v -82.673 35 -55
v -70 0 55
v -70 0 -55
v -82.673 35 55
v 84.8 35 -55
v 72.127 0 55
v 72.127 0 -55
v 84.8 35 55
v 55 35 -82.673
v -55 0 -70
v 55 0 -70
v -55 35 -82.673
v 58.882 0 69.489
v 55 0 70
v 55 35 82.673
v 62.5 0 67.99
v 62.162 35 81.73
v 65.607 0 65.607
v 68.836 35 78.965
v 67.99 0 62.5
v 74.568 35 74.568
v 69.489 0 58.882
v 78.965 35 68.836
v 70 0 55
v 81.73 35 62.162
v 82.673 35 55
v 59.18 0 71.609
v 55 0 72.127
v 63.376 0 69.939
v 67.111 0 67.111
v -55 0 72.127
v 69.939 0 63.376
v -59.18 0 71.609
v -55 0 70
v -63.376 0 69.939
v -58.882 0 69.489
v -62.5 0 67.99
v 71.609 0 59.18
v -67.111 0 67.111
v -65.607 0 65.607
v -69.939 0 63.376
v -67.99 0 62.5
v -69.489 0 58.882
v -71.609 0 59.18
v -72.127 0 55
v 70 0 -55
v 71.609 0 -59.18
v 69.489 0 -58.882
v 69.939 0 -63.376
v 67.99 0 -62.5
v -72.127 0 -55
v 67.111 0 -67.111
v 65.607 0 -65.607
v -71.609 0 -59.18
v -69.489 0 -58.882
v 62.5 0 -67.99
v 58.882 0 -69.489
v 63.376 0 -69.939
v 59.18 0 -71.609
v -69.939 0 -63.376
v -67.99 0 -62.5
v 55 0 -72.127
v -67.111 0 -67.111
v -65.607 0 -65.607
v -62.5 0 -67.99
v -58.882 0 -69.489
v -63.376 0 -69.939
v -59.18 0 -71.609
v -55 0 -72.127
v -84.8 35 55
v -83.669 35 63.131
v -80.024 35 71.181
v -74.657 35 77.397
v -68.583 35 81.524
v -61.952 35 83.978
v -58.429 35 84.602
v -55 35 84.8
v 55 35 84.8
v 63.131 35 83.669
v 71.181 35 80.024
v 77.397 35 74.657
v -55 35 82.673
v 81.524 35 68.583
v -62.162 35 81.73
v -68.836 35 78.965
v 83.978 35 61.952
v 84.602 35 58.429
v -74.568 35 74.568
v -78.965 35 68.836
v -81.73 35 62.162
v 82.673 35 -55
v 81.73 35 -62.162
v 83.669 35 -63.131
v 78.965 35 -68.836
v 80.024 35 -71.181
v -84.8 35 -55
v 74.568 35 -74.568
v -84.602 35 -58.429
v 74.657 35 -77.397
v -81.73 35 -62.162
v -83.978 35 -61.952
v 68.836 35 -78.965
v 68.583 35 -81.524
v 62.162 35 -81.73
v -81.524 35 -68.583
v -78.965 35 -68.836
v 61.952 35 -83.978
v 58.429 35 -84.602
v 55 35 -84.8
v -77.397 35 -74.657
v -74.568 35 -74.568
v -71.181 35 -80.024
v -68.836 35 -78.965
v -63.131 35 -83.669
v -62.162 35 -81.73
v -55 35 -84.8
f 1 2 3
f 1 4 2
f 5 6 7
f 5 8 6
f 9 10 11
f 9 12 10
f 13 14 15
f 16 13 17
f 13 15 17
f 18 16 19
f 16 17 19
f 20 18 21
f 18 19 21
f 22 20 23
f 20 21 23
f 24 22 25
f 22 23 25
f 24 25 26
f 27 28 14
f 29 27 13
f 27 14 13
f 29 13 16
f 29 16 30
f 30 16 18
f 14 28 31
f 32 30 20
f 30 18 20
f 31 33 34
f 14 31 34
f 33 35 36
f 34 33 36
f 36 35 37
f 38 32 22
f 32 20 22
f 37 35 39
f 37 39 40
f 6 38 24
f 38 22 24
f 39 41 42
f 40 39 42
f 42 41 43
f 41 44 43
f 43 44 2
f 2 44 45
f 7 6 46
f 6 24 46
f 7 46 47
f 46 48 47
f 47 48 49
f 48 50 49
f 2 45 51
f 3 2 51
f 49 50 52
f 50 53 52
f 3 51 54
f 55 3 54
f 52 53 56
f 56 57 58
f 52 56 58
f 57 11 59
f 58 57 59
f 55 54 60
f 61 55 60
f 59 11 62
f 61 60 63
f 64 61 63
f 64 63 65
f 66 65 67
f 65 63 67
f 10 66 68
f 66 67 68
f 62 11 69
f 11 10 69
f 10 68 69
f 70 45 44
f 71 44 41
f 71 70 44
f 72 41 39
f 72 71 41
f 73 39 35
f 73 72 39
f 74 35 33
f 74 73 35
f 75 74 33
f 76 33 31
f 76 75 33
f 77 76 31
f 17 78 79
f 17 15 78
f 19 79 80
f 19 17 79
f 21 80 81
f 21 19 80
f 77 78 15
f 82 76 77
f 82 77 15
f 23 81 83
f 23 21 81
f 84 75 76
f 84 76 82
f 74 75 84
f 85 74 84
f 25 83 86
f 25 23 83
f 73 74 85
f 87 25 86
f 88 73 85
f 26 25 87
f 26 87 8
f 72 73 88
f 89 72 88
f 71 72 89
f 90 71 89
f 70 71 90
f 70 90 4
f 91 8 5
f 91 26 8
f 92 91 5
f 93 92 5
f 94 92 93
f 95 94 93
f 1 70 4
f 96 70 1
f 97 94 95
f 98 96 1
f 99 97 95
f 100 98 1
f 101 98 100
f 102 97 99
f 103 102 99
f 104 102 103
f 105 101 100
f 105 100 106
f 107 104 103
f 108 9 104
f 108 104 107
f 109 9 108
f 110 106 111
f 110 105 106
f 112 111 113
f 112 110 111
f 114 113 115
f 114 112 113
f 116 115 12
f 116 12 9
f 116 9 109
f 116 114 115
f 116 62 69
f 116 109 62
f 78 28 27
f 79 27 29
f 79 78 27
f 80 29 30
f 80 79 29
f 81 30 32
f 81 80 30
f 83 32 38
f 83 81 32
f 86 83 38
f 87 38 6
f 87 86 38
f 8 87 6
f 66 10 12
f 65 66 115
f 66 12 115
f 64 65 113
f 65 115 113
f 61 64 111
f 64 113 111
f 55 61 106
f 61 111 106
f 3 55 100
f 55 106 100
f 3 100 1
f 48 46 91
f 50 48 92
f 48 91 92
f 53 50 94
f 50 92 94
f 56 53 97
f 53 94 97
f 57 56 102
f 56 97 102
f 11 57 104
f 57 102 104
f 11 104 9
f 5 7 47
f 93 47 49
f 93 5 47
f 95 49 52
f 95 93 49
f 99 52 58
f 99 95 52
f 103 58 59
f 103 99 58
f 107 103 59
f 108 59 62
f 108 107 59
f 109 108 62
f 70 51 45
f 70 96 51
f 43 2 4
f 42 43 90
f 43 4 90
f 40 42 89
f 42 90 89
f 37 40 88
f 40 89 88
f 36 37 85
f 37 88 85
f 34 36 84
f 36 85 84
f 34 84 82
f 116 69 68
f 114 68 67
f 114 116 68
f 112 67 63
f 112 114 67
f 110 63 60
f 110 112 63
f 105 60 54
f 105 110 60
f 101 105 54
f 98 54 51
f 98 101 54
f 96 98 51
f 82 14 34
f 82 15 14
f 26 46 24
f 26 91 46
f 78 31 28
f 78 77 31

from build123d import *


with BuildPart() as part:
    # Outlet Profile for Hopper Shape → Hopper Shape section 0
    with BuildSketch(Plane(origin=(0, 0, 0), x_dir=(1, 0, 0), z_dir=(0, 1, 0))):
        with BuildLine():
            Line((-55, -72.127068082), (55, -72.127068082))
            # circular arc as an exact rational Bezier (weights 1, cos(half-angle), 1)
            Bezier((55, -72.127068082), (72.127068082, -72.127068082), (72.127068082, -55), weights=[1, 0.707106781, 1])
            Line((72.127068082, -55), (72.127068082, 55))
            Bezier((72.127068082, 55), (72.127068082, 72.127068082), (55, 72.127068082), weights=[1, 0.707106781, 1])
            Line((55, 72.127068082), (-55, 72.127068082))
            Bezier((-55, 72.127068082), (-72.127068082, 72.127068082), (-72.127068082, 55), weights=[1, 0.707106781, 1])
            Line((-72.127068082, 55), (-72.127068082, -55))
            Bezier((-72.127068082, -55), (-72.127068082, -72.127068082), (-55, -72.127068082), weights=[1, 0.707106781, 1])
        make_face()
    # Inlet Profile for Hopper Shape → Hopper Shape section 1
    with BuildSketch(Plane(origin=(0, 35, 0), x_dir=(1, 0, 0), z_dir=(0, 1, 0))):
        with BuildLine():
            Line((-55, -84.8), (55, -84.8))
            Bezier((55, -84.8), (84.8, -84.8), (84.8, -55), weights=[1, 0.707106781, 1])
            Line((84.8, -55), (84.8, 55))
            Bezier((84.8, 55), (84.8, 84.8), (55, 84.8), weights=[1, 0.707106781, 1])
            Line((55, 84.8), (-55, 84.8))
            Bezier((-55, 84.8), (-84.8, 84.8), (-84.8, 55), weights=[1, 0.707106781, 1])
            Line((-84.8, 55), (-84.8, -55))
            Bezier((-84.8, -55), (-84.8, -84.8), (-55, -84.8), weights=[1, 0.707106781, 1])
        make_face()
    loft()

    # Wall Thickness: read off the stored shape, not the designer's step
    # Wall Thickness: loft between two sections, ruled curve by curve
    wall_thickness_from = [
        Edge.make_three_point_arc((-55, 0, -70), (-65.606601718, 0, -65.606601718), (-70, 0, -55)),
        Edge.make_three_point_arc((-70, 0, 55), (-65.606601718, 0, 65.606601718), (-55, 0, 70)),
        Edge.make_three_point_arc((55, 0, 70), (65.606601718, 0, 65.606601718), (70, 0, 55)),
        Edge.make_three_point_arc((70, 0, -55), (65.606601718, 0, -65.606601718), (55, 0, -70)),
        Edge.make_line((-55, 0, -70), (55, 0, -70)),
        Edge.make_line((-70, 0, 55), (-70, 0, -55)),
        Edge.make_line((55, 0, 70), (-55, 0, 70)),
        Edge.make_line((70, 0, -55), (70, 0, 55)),
    ]
    wall_thickness_to = [
        Edge.make_three_point_arc((-55, 35, -82.672931918), (-74.567717815, 35, -74.567717815), (-82.672931918, 35, -55)),
        Edge.make_three_point_arc((-82.672931918, 35, 55), (-74.567717815, 35, 74.567717815), (-55, 35, 82.672931918)),
        Edge.make_three_point_arc((55, 35, 82.672931918), (74.567717815, 35, 74.567717815), (82.672931918, 35, 55)),
        Edge.make_three_point_arc((82.672931918, 35, -55), (74.567717815, 35, -74.567717815), (55, 35, -82.672931918)),
        Edge.make_line((-55, 35, -82.672931918), (55, 35, -82.672931918)),
        Edge.make_line((-82.672931918, 35, 55), (-82.672931918, 35, -55)),
        Edge.make_line((55, 35, 82.672931918), (-55, 35, 82.672931918)),
        Edge.make_line((82.672931918, 35, -55), (82.672931918, 35, 55)),
    ]
    wall_thickness = Solid(Shell([*[Face.make_surface_from_curves(wall_thickness_from[k], wall_thickness_to[k]) for k in range(8)], Face(Wire(wall_thickness_from)), Face(Wire(wall_thickness_to))]))
    add(wall_thickness, mode=Mode.SUBTRACT)


solid = part.part
